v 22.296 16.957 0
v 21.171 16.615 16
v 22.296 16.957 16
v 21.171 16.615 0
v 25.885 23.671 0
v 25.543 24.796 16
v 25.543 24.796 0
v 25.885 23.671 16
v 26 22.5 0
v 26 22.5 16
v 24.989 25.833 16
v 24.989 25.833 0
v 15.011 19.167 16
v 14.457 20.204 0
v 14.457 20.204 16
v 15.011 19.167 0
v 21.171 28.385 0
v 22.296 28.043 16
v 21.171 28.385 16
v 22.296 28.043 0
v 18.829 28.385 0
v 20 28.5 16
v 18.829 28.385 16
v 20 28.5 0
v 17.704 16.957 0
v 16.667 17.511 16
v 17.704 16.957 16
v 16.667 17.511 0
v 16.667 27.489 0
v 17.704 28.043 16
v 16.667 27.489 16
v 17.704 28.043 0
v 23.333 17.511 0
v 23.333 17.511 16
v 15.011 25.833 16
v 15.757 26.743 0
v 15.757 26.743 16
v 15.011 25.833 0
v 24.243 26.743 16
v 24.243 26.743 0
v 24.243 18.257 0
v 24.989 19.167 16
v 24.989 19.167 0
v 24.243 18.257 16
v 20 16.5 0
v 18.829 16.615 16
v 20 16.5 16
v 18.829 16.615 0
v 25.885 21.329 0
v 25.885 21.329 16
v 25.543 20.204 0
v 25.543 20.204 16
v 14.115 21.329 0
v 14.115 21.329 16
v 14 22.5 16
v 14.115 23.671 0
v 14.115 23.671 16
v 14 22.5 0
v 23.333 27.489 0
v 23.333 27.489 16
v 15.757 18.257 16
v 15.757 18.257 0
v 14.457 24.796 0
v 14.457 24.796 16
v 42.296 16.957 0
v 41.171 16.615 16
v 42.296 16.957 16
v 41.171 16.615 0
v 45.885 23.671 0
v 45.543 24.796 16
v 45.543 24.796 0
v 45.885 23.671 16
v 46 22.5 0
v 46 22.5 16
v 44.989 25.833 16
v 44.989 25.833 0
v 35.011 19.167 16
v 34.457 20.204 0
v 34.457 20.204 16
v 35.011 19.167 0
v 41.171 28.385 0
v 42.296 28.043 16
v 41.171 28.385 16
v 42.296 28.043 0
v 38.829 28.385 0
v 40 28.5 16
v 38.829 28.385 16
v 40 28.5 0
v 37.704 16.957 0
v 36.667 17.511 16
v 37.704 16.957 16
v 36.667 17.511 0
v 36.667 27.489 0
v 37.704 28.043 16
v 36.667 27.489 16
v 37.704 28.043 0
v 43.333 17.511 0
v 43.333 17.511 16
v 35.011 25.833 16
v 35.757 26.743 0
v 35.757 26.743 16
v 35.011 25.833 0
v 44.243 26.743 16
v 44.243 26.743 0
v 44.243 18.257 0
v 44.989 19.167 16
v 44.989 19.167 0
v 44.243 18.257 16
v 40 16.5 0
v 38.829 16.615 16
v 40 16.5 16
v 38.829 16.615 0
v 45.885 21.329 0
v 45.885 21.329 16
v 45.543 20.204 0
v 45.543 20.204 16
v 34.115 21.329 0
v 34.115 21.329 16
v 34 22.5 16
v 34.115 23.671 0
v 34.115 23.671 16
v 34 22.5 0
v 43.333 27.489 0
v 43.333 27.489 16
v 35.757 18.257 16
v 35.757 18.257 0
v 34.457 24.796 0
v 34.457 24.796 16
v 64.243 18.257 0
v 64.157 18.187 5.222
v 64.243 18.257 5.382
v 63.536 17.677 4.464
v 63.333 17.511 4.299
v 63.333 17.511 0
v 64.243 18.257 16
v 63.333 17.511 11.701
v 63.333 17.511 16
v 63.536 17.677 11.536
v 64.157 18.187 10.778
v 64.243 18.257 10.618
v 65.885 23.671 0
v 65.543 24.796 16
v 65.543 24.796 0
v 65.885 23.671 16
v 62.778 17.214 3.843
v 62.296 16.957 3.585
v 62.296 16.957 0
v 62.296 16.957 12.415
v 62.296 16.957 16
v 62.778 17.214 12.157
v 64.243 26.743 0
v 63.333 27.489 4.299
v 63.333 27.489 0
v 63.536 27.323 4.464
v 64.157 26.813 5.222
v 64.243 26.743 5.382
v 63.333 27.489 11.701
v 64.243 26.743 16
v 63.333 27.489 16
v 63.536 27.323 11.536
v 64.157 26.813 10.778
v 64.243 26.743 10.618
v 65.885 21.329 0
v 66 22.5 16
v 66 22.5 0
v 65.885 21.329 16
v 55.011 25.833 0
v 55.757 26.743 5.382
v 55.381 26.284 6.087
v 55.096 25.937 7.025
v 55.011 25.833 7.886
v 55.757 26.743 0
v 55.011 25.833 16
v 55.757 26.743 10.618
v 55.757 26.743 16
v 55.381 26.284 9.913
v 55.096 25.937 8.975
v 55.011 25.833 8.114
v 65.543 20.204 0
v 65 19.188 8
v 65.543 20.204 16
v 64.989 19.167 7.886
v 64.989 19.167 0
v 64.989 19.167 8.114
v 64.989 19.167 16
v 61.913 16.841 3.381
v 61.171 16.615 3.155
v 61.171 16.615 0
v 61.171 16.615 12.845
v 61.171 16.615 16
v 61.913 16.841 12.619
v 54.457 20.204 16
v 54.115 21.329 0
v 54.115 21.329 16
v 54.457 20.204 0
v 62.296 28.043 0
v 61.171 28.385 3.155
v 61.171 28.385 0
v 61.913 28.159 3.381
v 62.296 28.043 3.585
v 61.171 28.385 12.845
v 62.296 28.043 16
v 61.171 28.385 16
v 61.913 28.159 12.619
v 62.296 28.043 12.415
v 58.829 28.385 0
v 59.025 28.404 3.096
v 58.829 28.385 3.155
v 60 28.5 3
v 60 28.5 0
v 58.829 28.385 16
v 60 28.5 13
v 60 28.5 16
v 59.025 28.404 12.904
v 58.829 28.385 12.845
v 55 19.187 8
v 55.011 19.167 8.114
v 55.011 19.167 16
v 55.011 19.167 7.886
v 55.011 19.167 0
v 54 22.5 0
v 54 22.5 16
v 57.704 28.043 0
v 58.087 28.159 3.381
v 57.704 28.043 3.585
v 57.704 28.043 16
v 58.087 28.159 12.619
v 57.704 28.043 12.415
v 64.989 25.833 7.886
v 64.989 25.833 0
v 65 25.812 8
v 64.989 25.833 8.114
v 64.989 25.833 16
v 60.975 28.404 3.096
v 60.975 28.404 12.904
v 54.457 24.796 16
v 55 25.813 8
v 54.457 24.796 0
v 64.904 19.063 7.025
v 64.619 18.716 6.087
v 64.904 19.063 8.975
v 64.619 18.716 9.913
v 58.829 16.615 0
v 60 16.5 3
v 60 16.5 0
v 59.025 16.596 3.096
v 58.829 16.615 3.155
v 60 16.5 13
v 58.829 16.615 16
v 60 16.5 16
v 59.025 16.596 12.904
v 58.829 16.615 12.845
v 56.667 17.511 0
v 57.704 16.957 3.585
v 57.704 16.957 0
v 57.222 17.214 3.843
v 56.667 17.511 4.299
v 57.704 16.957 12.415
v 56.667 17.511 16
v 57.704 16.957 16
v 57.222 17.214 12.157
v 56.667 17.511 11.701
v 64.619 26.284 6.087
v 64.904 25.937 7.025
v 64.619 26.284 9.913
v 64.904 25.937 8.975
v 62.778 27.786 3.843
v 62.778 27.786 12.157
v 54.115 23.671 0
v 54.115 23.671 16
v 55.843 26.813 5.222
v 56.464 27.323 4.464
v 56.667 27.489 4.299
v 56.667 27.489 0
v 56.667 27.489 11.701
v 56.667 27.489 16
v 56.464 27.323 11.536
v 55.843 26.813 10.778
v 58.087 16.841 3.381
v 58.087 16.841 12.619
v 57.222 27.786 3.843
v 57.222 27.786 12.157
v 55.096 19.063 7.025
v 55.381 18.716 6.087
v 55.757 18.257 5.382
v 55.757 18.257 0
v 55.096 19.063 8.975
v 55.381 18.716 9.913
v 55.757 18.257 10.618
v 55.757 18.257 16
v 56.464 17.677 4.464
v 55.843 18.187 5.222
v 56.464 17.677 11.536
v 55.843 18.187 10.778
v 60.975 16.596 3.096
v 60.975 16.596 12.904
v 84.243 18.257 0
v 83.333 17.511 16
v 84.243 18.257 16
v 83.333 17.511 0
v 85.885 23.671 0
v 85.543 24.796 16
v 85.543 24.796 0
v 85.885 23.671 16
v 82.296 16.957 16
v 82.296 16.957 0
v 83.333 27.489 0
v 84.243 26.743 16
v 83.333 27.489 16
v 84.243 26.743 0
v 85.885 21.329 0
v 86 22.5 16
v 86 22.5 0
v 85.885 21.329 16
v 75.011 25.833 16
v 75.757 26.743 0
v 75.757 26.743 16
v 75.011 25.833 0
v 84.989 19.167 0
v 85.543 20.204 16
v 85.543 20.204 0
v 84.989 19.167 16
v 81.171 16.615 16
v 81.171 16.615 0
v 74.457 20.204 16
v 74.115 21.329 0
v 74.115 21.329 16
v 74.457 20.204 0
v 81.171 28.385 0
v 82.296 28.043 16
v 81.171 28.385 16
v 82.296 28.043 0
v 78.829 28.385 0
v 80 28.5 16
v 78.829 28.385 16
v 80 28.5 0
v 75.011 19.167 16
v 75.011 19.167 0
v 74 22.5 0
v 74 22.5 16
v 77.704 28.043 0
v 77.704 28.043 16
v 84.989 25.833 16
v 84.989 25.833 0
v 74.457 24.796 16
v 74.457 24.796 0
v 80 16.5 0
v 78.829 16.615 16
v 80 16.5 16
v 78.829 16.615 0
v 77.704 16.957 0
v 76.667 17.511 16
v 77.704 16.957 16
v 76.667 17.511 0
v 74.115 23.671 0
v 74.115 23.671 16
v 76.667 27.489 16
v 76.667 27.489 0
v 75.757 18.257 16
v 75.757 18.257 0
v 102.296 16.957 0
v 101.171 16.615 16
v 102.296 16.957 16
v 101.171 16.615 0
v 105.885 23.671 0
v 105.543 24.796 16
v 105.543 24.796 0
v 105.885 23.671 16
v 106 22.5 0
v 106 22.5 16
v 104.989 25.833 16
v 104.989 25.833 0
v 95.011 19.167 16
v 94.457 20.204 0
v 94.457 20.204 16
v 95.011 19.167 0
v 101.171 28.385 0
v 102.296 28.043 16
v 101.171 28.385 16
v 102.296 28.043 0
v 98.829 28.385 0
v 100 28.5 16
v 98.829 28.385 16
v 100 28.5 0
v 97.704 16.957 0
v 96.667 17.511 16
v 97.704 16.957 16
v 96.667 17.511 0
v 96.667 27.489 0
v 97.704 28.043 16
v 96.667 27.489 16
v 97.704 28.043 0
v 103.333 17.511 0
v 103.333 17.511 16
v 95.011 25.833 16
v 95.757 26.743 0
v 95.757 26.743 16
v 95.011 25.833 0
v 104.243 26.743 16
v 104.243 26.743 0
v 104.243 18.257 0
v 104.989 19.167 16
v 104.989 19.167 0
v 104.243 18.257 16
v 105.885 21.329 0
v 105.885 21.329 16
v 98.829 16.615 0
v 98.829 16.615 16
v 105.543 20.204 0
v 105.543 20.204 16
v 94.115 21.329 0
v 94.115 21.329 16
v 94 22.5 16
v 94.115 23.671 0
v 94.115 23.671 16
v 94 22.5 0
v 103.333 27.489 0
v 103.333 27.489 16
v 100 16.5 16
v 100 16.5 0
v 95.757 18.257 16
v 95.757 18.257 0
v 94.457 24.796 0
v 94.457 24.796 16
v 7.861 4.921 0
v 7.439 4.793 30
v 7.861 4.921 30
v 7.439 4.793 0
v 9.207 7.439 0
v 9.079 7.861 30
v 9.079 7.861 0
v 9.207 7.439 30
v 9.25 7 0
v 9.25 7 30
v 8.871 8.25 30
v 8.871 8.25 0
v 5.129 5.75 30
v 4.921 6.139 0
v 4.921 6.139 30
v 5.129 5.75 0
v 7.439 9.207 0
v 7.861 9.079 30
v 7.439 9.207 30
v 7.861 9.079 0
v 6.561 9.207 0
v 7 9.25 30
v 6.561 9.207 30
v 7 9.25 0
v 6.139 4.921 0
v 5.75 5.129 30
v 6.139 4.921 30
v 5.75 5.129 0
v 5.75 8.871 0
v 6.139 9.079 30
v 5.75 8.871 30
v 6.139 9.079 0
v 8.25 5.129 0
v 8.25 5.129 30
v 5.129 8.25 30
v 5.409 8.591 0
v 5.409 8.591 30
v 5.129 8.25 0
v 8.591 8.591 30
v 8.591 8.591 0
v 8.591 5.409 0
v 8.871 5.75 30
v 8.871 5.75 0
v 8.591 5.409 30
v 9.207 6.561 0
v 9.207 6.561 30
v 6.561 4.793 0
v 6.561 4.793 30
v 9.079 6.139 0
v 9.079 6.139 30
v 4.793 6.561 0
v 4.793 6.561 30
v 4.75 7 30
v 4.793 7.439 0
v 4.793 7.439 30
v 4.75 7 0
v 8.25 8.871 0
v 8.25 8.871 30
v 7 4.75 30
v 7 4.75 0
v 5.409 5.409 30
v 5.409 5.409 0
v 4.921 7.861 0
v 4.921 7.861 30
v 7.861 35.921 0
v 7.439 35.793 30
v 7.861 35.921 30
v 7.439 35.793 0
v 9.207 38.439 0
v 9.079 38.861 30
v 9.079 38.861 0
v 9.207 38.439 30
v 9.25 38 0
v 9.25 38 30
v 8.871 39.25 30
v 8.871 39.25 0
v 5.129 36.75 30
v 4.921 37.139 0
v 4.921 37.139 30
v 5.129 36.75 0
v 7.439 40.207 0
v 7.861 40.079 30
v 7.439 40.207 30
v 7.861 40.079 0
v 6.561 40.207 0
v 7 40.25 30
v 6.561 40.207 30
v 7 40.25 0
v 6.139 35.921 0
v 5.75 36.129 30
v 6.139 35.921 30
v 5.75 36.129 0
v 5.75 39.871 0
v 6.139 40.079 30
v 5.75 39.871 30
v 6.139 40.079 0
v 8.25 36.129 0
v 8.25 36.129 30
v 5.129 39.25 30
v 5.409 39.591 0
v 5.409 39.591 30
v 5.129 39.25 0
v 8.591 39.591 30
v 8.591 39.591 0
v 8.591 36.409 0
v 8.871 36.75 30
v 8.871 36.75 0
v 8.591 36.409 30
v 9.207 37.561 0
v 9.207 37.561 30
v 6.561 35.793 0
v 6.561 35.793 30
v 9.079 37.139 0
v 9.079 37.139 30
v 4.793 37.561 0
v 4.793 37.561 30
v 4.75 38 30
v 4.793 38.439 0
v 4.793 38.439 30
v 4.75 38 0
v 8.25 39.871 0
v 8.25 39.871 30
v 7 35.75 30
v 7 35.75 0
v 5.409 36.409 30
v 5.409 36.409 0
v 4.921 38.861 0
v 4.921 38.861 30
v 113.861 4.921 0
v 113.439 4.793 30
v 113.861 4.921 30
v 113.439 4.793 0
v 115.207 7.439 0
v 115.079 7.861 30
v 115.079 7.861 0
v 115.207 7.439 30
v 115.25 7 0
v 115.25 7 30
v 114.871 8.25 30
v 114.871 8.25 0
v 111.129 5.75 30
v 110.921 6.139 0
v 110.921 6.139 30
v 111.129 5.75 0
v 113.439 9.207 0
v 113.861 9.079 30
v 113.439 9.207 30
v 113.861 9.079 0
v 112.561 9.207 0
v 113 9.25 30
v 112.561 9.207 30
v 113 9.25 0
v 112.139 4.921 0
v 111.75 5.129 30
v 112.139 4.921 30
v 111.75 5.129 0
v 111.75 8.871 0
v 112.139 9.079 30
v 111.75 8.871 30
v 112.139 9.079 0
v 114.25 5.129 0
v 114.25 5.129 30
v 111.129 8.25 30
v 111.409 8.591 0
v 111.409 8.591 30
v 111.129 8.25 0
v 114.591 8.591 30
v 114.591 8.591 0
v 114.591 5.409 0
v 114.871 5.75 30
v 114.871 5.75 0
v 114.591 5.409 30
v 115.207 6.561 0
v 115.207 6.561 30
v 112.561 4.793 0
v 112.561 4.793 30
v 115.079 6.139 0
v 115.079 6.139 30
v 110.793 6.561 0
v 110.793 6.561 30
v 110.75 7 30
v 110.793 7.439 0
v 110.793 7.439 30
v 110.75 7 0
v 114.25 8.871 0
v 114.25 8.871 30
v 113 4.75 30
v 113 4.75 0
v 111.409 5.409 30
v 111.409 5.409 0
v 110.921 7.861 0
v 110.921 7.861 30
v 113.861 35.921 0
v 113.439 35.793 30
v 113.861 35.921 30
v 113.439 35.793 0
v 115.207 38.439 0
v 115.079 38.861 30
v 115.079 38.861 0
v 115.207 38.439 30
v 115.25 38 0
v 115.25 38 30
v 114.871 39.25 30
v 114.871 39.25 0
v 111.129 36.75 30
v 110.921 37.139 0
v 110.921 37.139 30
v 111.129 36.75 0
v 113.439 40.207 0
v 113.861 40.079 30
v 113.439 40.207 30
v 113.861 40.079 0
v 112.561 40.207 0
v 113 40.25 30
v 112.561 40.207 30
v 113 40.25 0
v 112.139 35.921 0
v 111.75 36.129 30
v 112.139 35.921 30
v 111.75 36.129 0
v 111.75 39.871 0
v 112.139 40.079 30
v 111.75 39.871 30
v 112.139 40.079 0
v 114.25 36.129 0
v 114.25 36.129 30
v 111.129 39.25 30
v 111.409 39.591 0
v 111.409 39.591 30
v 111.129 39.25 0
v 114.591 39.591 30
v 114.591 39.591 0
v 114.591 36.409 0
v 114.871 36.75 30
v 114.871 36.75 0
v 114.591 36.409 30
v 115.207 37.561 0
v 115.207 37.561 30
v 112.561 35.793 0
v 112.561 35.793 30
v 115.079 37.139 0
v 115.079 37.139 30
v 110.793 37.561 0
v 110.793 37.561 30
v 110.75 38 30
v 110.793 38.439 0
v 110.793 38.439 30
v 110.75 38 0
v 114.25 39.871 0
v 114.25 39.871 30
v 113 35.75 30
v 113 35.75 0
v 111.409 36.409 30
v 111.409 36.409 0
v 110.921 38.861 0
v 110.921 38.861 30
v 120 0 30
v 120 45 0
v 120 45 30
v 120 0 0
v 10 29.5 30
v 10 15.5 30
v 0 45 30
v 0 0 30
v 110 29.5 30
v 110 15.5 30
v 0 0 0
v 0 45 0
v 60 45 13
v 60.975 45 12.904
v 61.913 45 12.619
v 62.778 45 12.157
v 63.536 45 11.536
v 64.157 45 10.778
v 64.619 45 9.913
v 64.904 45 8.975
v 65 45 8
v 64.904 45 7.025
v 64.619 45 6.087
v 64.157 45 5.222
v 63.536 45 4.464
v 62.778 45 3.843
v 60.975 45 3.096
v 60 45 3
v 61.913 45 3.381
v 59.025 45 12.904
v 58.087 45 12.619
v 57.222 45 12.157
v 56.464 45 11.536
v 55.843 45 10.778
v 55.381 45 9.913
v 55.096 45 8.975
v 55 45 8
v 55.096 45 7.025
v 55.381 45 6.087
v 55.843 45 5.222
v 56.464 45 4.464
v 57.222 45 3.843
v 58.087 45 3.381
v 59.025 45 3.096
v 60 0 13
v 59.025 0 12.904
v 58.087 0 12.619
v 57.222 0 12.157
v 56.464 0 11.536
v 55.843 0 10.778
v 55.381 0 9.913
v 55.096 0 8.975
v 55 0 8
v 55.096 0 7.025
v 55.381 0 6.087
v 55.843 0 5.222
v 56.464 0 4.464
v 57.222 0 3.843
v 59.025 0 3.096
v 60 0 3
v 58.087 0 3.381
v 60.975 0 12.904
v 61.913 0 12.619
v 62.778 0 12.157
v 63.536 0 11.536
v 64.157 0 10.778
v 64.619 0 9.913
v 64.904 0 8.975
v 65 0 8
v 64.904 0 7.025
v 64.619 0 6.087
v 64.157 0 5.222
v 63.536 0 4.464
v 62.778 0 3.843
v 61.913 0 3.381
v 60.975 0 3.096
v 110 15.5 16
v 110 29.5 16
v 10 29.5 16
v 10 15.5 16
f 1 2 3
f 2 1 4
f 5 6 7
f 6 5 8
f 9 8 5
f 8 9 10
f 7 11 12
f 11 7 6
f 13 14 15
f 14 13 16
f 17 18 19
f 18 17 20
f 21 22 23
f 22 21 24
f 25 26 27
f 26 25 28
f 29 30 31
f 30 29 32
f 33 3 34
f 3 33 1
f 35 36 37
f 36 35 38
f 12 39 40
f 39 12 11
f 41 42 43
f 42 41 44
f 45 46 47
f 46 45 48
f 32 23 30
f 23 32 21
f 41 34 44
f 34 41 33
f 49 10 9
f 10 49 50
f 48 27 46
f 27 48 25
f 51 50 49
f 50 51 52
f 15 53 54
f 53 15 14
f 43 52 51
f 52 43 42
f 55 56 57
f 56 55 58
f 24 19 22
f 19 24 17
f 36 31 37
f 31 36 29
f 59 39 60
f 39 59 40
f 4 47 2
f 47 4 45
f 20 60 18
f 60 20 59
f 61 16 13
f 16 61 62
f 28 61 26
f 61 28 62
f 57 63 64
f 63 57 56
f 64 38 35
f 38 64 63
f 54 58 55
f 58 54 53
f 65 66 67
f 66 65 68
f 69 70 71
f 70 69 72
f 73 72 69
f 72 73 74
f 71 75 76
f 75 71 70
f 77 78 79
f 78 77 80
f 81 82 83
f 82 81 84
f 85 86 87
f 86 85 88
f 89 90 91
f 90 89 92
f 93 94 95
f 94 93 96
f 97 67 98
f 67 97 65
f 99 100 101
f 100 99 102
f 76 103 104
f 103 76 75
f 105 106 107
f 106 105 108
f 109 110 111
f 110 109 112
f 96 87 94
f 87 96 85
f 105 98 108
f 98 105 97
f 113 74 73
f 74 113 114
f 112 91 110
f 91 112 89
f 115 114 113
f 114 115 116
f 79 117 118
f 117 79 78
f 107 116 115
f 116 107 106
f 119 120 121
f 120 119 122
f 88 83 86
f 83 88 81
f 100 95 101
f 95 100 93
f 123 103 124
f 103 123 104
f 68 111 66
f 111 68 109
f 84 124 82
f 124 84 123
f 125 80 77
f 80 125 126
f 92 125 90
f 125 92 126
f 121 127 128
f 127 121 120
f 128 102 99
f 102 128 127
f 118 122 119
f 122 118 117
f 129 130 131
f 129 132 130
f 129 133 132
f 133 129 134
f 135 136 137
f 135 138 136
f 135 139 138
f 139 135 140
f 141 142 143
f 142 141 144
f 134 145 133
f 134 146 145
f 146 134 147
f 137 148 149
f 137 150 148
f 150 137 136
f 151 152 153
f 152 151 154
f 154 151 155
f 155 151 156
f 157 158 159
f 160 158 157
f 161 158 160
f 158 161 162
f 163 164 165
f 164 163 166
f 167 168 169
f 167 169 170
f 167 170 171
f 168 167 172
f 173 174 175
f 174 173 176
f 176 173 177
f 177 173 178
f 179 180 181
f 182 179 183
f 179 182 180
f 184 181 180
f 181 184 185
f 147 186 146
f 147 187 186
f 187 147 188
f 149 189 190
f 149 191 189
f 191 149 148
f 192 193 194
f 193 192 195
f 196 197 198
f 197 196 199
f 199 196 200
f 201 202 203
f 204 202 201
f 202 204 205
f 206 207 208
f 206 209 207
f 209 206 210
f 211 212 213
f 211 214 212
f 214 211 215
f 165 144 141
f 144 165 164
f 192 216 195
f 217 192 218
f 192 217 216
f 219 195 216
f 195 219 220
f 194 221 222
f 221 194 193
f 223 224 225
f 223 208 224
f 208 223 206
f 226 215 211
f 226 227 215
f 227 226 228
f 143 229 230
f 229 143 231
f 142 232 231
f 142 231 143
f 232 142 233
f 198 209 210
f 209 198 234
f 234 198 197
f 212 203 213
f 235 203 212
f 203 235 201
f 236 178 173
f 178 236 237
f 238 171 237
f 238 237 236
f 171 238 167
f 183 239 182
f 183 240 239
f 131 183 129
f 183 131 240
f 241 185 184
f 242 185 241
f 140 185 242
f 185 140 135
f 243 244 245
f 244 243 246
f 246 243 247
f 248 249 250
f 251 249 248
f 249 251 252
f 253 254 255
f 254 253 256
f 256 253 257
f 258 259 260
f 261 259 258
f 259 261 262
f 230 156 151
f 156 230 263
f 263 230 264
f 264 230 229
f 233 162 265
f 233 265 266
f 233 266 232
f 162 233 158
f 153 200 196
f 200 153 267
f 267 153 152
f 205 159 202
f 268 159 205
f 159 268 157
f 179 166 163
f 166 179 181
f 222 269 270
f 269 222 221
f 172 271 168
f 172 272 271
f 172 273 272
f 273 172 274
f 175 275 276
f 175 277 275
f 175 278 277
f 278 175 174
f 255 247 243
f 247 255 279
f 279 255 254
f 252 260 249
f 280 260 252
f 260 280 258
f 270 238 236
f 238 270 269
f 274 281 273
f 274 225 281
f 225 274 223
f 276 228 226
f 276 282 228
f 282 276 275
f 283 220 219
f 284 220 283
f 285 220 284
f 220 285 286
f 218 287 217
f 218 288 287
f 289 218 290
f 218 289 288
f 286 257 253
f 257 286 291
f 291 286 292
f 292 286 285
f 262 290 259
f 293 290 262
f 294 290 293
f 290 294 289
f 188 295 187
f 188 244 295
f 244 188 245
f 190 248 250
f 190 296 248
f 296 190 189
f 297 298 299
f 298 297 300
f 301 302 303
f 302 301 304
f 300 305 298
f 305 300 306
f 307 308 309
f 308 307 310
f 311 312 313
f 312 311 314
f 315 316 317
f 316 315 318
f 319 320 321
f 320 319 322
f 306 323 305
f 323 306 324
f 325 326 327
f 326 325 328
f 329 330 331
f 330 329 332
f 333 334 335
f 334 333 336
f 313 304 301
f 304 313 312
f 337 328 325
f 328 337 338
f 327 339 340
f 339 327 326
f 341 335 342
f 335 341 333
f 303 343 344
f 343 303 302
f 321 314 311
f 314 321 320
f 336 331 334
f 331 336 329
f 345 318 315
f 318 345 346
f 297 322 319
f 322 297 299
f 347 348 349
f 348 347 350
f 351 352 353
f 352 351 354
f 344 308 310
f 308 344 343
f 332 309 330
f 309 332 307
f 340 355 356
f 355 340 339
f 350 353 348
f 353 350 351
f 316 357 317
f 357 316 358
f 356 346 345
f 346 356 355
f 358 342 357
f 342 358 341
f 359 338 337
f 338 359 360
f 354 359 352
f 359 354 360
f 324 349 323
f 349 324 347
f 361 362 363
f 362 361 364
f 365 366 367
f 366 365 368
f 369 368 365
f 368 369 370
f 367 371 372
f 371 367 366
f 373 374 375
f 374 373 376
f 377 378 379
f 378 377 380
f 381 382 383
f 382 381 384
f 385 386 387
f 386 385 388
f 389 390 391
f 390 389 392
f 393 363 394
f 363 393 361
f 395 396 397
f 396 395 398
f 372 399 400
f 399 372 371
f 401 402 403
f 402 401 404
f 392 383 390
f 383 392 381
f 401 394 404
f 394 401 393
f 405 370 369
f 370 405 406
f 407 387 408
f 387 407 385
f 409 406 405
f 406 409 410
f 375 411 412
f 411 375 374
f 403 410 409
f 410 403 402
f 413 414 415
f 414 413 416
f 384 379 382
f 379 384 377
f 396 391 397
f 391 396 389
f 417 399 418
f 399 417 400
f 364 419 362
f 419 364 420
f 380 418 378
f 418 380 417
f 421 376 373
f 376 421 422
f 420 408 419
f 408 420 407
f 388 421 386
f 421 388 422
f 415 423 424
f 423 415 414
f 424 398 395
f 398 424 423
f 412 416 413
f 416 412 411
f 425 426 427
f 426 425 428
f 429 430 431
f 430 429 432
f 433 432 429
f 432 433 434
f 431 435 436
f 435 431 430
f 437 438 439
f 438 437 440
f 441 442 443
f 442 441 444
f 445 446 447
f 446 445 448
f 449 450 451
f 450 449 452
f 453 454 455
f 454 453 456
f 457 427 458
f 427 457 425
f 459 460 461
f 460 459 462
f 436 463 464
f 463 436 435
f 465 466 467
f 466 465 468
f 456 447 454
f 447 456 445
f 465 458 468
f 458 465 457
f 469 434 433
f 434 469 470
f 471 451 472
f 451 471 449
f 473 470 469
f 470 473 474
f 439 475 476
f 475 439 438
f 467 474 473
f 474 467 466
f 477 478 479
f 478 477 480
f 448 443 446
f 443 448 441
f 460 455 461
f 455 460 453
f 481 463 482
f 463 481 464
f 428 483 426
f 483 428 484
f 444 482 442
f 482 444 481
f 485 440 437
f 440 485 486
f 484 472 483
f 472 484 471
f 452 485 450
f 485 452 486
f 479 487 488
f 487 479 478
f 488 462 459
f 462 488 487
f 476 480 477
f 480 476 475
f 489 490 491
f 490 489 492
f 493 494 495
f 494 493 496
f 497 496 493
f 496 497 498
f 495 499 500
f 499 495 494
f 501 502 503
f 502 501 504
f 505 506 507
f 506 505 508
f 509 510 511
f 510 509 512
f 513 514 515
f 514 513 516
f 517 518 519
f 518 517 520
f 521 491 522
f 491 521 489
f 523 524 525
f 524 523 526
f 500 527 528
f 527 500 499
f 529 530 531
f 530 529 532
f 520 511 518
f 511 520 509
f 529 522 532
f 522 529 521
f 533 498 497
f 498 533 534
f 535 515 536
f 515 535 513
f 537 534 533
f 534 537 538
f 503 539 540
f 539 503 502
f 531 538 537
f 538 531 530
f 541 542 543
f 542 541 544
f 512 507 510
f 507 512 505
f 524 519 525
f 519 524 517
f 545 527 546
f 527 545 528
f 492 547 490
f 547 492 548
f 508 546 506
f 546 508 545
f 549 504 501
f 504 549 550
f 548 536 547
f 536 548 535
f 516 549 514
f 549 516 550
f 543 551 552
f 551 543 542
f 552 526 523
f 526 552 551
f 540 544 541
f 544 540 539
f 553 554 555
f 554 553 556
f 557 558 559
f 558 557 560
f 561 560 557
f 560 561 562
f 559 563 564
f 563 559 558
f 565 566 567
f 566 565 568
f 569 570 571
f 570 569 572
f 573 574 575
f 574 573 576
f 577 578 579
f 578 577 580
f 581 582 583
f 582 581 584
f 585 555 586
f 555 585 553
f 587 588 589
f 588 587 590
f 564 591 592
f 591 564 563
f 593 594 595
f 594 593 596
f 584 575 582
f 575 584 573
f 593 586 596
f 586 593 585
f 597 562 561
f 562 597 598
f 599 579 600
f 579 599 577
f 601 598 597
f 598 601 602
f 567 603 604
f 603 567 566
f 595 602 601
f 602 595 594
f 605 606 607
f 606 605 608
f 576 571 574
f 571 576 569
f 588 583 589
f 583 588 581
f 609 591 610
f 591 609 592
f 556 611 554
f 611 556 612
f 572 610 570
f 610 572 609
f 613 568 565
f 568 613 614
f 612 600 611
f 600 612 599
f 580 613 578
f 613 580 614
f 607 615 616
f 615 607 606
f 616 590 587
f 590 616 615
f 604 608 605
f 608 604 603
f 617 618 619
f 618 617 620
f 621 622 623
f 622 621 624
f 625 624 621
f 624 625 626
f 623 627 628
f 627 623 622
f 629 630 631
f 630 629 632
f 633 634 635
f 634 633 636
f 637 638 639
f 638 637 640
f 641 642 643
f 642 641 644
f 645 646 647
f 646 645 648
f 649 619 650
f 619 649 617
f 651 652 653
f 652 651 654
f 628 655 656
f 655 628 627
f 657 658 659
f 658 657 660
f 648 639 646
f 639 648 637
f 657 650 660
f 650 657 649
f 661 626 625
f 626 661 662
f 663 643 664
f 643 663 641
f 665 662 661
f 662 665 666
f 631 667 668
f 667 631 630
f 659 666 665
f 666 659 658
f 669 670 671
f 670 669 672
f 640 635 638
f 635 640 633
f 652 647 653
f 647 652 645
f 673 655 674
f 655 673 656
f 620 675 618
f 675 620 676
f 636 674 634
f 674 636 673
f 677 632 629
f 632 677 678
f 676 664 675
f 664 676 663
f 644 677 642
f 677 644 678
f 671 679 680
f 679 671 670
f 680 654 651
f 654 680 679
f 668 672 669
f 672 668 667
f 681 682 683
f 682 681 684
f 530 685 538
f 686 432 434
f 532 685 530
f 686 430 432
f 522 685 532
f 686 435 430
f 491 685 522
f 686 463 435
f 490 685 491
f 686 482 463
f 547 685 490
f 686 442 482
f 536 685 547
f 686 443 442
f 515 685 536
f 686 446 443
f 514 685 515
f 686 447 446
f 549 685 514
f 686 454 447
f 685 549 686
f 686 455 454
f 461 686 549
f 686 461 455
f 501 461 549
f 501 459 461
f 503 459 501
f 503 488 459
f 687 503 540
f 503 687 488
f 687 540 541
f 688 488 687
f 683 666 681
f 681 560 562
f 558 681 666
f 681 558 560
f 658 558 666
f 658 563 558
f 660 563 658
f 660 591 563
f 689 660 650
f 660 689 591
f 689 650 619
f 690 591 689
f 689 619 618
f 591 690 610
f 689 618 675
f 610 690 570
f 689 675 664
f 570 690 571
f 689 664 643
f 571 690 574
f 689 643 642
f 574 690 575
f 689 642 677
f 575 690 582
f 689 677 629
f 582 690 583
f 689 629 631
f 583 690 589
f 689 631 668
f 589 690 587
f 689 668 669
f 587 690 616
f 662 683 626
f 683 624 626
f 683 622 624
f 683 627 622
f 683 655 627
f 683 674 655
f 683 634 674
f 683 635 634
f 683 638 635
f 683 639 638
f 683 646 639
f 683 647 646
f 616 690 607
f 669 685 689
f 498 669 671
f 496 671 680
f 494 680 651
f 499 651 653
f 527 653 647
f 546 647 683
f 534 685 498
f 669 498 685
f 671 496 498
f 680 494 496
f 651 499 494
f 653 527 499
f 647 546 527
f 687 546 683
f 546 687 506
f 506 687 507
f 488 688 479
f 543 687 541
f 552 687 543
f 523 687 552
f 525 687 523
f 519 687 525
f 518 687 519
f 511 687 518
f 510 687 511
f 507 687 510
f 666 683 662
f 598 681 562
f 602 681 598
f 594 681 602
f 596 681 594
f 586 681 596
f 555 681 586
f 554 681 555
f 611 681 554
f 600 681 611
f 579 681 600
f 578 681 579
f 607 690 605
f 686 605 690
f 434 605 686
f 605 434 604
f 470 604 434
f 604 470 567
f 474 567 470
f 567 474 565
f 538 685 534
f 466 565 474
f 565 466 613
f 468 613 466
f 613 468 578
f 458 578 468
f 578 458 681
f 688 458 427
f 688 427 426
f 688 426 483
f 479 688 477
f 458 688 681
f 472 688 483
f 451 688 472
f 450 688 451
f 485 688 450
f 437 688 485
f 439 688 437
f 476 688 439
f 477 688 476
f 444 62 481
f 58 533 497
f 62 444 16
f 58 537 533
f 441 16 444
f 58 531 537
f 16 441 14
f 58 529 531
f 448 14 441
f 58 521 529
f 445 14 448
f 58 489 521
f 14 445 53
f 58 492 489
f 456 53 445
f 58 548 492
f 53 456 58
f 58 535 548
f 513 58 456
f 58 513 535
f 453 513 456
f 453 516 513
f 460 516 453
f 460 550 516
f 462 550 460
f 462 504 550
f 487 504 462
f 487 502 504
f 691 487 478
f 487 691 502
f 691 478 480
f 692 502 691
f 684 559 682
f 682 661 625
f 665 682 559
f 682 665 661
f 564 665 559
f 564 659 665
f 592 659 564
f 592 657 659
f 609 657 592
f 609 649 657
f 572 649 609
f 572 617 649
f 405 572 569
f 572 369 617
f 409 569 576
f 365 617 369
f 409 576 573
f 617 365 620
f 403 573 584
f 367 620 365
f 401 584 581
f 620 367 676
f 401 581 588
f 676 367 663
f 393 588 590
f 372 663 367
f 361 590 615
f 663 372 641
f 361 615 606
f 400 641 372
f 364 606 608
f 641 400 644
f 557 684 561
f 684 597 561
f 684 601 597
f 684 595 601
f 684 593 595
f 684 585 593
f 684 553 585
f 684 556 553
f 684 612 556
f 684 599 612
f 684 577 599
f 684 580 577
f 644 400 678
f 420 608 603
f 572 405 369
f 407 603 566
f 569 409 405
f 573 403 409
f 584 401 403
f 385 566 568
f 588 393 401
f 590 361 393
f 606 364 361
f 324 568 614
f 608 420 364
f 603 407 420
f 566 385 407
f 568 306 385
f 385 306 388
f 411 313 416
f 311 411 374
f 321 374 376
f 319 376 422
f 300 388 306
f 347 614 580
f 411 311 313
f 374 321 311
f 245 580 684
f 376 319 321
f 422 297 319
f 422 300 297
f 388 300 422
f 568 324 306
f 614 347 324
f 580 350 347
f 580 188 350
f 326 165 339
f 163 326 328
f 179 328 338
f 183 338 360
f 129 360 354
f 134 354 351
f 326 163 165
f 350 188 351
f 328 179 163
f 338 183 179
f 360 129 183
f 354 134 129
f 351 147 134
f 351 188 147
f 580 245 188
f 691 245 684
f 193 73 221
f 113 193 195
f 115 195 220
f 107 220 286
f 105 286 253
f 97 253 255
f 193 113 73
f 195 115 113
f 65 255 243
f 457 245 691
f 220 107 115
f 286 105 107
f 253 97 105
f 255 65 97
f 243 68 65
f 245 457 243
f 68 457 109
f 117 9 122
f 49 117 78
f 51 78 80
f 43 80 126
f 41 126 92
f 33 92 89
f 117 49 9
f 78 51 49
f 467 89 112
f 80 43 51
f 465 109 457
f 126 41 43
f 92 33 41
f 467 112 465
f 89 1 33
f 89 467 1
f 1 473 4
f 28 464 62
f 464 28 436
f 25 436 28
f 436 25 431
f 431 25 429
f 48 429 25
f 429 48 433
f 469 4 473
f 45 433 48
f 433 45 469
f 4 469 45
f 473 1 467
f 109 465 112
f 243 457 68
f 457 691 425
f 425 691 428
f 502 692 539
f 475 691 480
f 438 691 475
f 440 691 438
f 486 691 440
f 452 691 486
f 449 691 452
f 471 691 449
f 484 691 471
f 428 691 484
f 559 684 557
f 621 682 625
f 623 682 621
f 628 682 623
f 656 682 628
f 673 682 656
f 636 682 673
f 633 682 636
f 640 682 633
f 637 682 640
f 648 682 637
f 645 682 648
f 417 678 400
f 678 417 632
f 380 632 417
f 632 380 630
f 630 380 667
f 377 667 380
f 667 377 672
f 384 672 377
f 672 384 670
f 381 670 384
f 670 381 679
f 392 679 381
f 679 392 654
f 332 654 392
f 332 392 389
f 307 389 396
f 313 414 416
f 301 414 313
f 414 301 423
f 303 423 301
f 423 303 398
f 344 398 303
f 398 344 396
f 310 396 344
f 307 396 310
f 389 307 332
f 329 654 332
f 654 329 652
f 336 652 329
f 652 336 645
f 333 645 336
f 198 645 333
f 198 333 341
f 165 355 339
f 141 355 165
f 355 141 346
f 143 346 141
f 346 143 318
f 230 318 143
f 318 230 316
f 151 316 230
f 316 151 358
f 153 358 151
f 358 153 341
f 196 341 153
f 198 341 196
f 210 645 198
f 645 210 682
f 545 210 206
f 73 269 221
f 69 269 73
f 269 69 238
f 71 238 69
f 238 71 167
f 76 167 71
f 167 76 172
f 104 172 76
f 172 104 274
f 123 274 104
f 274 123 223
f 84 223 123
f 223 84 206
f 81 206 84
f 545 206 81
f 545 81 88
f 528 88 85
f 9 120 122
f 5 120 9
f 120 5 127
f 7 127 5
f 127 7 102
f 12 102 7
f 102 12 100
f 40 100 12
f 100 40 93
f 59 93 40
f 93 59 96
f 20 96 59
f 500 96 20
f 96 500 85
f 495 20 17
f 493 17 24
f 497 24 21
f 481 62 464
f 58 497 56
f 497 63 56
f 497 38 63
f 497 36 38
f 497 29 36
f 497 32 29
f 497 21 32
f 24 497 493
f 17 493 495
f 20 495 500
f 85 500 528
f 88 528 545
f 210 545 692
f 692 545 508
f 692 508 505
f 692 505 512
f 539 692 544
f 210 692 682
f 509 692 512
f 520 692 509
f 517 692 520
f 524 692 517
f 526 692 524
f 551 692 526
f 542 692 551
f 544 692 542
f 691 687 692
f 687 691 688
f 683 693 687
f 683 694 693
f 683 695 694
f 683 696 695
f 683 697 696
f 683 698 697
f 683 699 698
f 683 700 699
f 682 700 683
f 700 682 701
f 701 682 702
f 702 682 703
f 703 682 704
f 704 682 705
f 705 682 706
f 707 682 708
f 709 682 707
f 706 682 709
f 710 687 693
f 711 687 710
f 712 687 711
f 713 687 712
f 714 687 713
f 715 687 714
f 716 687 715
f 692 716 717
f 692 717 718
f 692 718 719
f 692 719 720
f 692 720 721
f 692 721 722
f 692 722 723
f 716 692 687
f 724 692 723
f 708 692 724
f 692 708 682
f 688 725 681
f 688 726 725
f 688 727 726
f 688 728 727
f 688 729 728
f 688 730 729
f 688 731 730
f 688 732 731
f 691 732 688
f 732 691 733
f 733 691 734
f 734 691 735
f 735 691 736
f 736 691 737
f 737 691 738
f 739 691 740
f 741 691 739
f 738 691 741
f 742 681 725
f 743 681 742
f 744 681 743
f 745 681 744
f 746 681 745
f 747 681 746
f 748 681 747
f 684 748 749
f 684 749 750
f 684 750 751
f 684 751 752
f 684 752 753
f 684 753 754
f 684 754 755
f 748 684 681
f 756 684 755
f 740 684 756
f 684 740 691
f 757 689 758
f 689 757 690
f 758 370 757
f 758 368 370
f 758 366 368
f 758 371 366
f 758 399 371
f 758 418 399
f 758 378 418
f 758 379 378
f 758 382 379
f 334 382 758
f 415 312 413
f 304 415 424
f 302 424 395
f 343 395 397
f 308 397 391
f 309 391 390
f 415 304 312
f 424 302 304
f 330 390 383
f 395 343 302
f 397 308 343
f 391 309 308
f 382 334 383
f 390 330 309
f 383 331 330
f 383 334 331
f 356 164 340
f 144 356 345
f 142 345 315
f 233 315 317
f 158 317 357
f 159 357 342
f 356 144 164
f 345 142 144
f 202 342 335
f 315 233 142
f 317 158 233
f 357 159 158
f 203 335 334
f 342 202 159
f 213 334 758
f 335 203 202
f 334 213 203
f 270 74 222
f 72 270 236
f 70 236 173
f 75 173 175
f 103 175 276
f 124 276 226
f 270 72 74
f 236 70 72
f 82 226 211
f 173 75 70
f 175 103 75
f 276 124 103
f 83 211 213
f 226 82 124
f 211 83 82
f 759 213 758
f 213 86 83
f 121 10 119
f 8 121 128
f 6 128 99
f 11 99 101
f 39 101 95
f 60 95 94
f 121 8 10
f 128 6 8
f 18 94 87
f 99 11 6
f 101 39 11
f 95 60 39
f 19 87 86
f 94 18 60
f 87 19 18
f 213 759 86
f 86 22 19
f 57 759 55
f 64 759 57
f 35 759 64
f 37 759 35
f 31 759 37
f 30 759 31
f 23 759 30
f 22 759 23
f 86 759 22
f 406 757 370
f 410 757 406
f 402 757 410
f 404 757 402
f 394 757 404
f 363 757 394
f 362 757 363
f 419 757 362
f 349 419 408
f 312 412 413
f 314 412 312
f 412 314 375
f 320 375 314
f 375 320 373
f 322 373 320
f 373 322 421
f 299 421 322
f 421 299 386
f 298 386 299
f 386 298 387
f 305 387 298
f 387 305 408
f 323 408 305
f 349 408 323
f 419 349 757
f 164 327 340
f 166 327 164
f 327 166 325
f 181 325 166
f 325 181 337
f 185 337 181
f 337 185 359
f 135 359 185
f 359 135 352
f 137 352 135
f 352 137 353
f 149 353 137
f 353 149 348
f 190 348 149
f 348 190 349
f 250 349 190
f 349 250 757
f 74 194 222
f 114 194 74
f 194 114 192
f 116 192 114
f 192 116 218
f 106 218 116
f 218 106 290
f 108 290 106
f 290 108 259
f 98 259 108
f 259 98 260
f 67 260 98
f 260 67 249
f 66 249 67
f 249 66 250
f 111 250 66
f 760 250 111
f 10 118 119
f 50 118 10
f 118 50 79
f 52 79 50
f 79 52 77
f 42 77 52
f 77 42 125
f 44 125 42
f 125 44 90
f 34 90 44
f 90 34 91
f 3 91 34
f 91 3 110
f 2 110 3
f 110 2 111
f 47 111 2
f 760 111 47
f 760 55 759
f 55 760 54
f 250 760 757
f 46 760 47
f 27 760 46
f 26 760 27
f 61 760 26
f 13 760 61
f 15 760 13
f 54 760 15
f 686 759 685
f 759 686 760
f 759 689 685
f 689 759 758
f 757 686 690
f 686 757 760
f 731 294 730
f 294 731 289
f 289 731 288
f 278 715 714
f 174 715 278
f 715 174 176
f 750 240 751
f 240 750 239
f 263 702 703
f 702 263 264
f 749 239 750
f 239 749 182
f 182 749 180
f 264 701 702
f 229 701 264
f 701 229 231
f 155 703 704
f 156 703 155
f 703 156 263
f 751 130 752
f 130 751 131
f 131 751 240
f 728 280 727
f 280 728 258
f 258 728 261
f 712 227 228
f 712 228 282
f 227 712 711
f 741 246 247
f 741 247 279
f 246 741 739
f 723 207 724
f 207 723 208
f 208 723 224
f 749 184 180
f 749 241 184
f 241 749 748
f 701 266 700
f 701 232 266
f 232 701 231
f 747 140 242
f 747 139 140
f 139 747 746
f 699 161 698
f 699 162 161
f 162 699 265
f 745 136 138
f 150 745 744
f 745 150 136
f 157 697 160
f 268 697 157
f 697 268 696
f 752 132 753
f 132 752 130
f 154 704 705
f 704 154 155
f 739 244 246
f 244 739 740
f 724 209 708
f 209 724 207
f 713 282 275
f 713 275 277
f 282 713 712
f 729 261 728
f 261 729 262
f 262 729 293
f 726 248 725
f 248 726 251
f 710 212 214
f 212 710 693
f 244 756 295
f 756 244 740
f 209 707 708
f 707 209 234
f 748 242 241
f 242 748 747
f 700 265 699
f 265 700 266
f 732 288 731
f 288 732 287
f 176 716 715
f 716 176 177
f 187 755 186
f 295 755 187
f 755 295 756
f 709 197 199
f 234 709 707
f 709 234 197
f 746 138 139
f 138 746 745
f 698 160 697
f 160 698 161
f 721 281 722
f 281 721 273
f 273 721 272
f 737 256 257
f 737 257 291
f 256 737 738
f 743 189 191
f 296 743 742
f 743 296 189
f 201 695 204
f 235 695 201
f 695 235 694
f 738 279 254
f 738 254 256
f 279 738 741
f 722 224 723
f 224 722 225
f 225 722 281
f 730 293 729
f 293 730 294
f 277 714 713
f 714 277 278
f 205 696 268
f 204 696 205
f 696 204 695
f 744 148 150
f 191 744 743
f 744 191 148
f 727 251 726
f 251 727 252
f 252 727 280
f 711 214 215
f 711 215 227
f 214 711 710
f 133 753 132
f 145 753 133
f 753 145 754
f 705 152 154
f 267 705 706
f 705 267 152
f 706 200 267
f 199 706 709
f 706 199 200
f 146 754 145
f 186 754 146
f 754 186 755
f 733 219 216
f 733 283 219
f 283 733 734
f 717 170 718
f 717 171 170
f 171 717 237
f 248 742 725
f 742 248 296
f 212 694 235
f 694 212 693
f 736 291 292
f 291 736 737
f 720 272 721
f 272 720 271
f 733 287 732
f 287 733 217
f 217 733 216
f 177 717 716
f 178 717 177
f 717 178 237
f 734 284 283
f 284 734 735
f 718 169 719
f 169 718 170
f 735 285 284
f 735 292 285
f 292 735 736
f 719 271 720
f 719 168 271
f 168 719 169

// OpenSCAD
$fn = 32;

// ----------------------------------------------------------------------
// Manifold block: side_outlet manifold
// ----------------------------------------------------------------------

// --- parameters (mm) ---
block_l = 120;            // block length, X
block_w = 45;             // block width, Y
block_h = 30;             // block height, Z
port_d = 12;              // port bore diameter
port_pitch = 20;          // port pitch along X
gallery_d = 14;           // top gallery width, Y
gallery_depth = 14;       // gallery pocket depth
wall_p = 10;              // gallery end wall thickness, X
mnt_d = 4.5;              // mounting hole diameter
mnt_in = 7;               // mounting hole inset from the edges
out_d = 10;               // outlet bore diameter
out_z = 8;                // outlet axis height
fit_tol = 0.02;           // tolerance for press fits, mm
free_tol = 0.2;           // tolerance for clearance fits, mm

n_ports = 5;  // ports in the row
port_x0 = (block_l - (n_ports - 1) * port_pitch) / 2;  // first port X

difference() {
  cube([block_l, block_w, block_h]);
  for (i = [0 : n_ports - 1])
    translate([port_x0 + i * port_pitch, block_w / 2, -1])
      cylinder(h = block_h + 2, d = port_d);
  translate([wall_p, block_w / 2 - gallery_d / 2, block_h - gallery_depth])
    cube([block_l - 2 * wall_p, gallery_d, gallery_depth + 1]);
  for (cx = [mnt_in, block_l - mnt_in])
    for (cy = [mnt_in, block_w - mnt_in])
      translate([cx, cy, -1]) cylinder(h = block_h + 2, d = mnt_d);
  translate([block_l / 2, -1, out_z]) rotate([-90, 0, 0])
    cylinder(h = block_w + 2, d = out_d);
}
